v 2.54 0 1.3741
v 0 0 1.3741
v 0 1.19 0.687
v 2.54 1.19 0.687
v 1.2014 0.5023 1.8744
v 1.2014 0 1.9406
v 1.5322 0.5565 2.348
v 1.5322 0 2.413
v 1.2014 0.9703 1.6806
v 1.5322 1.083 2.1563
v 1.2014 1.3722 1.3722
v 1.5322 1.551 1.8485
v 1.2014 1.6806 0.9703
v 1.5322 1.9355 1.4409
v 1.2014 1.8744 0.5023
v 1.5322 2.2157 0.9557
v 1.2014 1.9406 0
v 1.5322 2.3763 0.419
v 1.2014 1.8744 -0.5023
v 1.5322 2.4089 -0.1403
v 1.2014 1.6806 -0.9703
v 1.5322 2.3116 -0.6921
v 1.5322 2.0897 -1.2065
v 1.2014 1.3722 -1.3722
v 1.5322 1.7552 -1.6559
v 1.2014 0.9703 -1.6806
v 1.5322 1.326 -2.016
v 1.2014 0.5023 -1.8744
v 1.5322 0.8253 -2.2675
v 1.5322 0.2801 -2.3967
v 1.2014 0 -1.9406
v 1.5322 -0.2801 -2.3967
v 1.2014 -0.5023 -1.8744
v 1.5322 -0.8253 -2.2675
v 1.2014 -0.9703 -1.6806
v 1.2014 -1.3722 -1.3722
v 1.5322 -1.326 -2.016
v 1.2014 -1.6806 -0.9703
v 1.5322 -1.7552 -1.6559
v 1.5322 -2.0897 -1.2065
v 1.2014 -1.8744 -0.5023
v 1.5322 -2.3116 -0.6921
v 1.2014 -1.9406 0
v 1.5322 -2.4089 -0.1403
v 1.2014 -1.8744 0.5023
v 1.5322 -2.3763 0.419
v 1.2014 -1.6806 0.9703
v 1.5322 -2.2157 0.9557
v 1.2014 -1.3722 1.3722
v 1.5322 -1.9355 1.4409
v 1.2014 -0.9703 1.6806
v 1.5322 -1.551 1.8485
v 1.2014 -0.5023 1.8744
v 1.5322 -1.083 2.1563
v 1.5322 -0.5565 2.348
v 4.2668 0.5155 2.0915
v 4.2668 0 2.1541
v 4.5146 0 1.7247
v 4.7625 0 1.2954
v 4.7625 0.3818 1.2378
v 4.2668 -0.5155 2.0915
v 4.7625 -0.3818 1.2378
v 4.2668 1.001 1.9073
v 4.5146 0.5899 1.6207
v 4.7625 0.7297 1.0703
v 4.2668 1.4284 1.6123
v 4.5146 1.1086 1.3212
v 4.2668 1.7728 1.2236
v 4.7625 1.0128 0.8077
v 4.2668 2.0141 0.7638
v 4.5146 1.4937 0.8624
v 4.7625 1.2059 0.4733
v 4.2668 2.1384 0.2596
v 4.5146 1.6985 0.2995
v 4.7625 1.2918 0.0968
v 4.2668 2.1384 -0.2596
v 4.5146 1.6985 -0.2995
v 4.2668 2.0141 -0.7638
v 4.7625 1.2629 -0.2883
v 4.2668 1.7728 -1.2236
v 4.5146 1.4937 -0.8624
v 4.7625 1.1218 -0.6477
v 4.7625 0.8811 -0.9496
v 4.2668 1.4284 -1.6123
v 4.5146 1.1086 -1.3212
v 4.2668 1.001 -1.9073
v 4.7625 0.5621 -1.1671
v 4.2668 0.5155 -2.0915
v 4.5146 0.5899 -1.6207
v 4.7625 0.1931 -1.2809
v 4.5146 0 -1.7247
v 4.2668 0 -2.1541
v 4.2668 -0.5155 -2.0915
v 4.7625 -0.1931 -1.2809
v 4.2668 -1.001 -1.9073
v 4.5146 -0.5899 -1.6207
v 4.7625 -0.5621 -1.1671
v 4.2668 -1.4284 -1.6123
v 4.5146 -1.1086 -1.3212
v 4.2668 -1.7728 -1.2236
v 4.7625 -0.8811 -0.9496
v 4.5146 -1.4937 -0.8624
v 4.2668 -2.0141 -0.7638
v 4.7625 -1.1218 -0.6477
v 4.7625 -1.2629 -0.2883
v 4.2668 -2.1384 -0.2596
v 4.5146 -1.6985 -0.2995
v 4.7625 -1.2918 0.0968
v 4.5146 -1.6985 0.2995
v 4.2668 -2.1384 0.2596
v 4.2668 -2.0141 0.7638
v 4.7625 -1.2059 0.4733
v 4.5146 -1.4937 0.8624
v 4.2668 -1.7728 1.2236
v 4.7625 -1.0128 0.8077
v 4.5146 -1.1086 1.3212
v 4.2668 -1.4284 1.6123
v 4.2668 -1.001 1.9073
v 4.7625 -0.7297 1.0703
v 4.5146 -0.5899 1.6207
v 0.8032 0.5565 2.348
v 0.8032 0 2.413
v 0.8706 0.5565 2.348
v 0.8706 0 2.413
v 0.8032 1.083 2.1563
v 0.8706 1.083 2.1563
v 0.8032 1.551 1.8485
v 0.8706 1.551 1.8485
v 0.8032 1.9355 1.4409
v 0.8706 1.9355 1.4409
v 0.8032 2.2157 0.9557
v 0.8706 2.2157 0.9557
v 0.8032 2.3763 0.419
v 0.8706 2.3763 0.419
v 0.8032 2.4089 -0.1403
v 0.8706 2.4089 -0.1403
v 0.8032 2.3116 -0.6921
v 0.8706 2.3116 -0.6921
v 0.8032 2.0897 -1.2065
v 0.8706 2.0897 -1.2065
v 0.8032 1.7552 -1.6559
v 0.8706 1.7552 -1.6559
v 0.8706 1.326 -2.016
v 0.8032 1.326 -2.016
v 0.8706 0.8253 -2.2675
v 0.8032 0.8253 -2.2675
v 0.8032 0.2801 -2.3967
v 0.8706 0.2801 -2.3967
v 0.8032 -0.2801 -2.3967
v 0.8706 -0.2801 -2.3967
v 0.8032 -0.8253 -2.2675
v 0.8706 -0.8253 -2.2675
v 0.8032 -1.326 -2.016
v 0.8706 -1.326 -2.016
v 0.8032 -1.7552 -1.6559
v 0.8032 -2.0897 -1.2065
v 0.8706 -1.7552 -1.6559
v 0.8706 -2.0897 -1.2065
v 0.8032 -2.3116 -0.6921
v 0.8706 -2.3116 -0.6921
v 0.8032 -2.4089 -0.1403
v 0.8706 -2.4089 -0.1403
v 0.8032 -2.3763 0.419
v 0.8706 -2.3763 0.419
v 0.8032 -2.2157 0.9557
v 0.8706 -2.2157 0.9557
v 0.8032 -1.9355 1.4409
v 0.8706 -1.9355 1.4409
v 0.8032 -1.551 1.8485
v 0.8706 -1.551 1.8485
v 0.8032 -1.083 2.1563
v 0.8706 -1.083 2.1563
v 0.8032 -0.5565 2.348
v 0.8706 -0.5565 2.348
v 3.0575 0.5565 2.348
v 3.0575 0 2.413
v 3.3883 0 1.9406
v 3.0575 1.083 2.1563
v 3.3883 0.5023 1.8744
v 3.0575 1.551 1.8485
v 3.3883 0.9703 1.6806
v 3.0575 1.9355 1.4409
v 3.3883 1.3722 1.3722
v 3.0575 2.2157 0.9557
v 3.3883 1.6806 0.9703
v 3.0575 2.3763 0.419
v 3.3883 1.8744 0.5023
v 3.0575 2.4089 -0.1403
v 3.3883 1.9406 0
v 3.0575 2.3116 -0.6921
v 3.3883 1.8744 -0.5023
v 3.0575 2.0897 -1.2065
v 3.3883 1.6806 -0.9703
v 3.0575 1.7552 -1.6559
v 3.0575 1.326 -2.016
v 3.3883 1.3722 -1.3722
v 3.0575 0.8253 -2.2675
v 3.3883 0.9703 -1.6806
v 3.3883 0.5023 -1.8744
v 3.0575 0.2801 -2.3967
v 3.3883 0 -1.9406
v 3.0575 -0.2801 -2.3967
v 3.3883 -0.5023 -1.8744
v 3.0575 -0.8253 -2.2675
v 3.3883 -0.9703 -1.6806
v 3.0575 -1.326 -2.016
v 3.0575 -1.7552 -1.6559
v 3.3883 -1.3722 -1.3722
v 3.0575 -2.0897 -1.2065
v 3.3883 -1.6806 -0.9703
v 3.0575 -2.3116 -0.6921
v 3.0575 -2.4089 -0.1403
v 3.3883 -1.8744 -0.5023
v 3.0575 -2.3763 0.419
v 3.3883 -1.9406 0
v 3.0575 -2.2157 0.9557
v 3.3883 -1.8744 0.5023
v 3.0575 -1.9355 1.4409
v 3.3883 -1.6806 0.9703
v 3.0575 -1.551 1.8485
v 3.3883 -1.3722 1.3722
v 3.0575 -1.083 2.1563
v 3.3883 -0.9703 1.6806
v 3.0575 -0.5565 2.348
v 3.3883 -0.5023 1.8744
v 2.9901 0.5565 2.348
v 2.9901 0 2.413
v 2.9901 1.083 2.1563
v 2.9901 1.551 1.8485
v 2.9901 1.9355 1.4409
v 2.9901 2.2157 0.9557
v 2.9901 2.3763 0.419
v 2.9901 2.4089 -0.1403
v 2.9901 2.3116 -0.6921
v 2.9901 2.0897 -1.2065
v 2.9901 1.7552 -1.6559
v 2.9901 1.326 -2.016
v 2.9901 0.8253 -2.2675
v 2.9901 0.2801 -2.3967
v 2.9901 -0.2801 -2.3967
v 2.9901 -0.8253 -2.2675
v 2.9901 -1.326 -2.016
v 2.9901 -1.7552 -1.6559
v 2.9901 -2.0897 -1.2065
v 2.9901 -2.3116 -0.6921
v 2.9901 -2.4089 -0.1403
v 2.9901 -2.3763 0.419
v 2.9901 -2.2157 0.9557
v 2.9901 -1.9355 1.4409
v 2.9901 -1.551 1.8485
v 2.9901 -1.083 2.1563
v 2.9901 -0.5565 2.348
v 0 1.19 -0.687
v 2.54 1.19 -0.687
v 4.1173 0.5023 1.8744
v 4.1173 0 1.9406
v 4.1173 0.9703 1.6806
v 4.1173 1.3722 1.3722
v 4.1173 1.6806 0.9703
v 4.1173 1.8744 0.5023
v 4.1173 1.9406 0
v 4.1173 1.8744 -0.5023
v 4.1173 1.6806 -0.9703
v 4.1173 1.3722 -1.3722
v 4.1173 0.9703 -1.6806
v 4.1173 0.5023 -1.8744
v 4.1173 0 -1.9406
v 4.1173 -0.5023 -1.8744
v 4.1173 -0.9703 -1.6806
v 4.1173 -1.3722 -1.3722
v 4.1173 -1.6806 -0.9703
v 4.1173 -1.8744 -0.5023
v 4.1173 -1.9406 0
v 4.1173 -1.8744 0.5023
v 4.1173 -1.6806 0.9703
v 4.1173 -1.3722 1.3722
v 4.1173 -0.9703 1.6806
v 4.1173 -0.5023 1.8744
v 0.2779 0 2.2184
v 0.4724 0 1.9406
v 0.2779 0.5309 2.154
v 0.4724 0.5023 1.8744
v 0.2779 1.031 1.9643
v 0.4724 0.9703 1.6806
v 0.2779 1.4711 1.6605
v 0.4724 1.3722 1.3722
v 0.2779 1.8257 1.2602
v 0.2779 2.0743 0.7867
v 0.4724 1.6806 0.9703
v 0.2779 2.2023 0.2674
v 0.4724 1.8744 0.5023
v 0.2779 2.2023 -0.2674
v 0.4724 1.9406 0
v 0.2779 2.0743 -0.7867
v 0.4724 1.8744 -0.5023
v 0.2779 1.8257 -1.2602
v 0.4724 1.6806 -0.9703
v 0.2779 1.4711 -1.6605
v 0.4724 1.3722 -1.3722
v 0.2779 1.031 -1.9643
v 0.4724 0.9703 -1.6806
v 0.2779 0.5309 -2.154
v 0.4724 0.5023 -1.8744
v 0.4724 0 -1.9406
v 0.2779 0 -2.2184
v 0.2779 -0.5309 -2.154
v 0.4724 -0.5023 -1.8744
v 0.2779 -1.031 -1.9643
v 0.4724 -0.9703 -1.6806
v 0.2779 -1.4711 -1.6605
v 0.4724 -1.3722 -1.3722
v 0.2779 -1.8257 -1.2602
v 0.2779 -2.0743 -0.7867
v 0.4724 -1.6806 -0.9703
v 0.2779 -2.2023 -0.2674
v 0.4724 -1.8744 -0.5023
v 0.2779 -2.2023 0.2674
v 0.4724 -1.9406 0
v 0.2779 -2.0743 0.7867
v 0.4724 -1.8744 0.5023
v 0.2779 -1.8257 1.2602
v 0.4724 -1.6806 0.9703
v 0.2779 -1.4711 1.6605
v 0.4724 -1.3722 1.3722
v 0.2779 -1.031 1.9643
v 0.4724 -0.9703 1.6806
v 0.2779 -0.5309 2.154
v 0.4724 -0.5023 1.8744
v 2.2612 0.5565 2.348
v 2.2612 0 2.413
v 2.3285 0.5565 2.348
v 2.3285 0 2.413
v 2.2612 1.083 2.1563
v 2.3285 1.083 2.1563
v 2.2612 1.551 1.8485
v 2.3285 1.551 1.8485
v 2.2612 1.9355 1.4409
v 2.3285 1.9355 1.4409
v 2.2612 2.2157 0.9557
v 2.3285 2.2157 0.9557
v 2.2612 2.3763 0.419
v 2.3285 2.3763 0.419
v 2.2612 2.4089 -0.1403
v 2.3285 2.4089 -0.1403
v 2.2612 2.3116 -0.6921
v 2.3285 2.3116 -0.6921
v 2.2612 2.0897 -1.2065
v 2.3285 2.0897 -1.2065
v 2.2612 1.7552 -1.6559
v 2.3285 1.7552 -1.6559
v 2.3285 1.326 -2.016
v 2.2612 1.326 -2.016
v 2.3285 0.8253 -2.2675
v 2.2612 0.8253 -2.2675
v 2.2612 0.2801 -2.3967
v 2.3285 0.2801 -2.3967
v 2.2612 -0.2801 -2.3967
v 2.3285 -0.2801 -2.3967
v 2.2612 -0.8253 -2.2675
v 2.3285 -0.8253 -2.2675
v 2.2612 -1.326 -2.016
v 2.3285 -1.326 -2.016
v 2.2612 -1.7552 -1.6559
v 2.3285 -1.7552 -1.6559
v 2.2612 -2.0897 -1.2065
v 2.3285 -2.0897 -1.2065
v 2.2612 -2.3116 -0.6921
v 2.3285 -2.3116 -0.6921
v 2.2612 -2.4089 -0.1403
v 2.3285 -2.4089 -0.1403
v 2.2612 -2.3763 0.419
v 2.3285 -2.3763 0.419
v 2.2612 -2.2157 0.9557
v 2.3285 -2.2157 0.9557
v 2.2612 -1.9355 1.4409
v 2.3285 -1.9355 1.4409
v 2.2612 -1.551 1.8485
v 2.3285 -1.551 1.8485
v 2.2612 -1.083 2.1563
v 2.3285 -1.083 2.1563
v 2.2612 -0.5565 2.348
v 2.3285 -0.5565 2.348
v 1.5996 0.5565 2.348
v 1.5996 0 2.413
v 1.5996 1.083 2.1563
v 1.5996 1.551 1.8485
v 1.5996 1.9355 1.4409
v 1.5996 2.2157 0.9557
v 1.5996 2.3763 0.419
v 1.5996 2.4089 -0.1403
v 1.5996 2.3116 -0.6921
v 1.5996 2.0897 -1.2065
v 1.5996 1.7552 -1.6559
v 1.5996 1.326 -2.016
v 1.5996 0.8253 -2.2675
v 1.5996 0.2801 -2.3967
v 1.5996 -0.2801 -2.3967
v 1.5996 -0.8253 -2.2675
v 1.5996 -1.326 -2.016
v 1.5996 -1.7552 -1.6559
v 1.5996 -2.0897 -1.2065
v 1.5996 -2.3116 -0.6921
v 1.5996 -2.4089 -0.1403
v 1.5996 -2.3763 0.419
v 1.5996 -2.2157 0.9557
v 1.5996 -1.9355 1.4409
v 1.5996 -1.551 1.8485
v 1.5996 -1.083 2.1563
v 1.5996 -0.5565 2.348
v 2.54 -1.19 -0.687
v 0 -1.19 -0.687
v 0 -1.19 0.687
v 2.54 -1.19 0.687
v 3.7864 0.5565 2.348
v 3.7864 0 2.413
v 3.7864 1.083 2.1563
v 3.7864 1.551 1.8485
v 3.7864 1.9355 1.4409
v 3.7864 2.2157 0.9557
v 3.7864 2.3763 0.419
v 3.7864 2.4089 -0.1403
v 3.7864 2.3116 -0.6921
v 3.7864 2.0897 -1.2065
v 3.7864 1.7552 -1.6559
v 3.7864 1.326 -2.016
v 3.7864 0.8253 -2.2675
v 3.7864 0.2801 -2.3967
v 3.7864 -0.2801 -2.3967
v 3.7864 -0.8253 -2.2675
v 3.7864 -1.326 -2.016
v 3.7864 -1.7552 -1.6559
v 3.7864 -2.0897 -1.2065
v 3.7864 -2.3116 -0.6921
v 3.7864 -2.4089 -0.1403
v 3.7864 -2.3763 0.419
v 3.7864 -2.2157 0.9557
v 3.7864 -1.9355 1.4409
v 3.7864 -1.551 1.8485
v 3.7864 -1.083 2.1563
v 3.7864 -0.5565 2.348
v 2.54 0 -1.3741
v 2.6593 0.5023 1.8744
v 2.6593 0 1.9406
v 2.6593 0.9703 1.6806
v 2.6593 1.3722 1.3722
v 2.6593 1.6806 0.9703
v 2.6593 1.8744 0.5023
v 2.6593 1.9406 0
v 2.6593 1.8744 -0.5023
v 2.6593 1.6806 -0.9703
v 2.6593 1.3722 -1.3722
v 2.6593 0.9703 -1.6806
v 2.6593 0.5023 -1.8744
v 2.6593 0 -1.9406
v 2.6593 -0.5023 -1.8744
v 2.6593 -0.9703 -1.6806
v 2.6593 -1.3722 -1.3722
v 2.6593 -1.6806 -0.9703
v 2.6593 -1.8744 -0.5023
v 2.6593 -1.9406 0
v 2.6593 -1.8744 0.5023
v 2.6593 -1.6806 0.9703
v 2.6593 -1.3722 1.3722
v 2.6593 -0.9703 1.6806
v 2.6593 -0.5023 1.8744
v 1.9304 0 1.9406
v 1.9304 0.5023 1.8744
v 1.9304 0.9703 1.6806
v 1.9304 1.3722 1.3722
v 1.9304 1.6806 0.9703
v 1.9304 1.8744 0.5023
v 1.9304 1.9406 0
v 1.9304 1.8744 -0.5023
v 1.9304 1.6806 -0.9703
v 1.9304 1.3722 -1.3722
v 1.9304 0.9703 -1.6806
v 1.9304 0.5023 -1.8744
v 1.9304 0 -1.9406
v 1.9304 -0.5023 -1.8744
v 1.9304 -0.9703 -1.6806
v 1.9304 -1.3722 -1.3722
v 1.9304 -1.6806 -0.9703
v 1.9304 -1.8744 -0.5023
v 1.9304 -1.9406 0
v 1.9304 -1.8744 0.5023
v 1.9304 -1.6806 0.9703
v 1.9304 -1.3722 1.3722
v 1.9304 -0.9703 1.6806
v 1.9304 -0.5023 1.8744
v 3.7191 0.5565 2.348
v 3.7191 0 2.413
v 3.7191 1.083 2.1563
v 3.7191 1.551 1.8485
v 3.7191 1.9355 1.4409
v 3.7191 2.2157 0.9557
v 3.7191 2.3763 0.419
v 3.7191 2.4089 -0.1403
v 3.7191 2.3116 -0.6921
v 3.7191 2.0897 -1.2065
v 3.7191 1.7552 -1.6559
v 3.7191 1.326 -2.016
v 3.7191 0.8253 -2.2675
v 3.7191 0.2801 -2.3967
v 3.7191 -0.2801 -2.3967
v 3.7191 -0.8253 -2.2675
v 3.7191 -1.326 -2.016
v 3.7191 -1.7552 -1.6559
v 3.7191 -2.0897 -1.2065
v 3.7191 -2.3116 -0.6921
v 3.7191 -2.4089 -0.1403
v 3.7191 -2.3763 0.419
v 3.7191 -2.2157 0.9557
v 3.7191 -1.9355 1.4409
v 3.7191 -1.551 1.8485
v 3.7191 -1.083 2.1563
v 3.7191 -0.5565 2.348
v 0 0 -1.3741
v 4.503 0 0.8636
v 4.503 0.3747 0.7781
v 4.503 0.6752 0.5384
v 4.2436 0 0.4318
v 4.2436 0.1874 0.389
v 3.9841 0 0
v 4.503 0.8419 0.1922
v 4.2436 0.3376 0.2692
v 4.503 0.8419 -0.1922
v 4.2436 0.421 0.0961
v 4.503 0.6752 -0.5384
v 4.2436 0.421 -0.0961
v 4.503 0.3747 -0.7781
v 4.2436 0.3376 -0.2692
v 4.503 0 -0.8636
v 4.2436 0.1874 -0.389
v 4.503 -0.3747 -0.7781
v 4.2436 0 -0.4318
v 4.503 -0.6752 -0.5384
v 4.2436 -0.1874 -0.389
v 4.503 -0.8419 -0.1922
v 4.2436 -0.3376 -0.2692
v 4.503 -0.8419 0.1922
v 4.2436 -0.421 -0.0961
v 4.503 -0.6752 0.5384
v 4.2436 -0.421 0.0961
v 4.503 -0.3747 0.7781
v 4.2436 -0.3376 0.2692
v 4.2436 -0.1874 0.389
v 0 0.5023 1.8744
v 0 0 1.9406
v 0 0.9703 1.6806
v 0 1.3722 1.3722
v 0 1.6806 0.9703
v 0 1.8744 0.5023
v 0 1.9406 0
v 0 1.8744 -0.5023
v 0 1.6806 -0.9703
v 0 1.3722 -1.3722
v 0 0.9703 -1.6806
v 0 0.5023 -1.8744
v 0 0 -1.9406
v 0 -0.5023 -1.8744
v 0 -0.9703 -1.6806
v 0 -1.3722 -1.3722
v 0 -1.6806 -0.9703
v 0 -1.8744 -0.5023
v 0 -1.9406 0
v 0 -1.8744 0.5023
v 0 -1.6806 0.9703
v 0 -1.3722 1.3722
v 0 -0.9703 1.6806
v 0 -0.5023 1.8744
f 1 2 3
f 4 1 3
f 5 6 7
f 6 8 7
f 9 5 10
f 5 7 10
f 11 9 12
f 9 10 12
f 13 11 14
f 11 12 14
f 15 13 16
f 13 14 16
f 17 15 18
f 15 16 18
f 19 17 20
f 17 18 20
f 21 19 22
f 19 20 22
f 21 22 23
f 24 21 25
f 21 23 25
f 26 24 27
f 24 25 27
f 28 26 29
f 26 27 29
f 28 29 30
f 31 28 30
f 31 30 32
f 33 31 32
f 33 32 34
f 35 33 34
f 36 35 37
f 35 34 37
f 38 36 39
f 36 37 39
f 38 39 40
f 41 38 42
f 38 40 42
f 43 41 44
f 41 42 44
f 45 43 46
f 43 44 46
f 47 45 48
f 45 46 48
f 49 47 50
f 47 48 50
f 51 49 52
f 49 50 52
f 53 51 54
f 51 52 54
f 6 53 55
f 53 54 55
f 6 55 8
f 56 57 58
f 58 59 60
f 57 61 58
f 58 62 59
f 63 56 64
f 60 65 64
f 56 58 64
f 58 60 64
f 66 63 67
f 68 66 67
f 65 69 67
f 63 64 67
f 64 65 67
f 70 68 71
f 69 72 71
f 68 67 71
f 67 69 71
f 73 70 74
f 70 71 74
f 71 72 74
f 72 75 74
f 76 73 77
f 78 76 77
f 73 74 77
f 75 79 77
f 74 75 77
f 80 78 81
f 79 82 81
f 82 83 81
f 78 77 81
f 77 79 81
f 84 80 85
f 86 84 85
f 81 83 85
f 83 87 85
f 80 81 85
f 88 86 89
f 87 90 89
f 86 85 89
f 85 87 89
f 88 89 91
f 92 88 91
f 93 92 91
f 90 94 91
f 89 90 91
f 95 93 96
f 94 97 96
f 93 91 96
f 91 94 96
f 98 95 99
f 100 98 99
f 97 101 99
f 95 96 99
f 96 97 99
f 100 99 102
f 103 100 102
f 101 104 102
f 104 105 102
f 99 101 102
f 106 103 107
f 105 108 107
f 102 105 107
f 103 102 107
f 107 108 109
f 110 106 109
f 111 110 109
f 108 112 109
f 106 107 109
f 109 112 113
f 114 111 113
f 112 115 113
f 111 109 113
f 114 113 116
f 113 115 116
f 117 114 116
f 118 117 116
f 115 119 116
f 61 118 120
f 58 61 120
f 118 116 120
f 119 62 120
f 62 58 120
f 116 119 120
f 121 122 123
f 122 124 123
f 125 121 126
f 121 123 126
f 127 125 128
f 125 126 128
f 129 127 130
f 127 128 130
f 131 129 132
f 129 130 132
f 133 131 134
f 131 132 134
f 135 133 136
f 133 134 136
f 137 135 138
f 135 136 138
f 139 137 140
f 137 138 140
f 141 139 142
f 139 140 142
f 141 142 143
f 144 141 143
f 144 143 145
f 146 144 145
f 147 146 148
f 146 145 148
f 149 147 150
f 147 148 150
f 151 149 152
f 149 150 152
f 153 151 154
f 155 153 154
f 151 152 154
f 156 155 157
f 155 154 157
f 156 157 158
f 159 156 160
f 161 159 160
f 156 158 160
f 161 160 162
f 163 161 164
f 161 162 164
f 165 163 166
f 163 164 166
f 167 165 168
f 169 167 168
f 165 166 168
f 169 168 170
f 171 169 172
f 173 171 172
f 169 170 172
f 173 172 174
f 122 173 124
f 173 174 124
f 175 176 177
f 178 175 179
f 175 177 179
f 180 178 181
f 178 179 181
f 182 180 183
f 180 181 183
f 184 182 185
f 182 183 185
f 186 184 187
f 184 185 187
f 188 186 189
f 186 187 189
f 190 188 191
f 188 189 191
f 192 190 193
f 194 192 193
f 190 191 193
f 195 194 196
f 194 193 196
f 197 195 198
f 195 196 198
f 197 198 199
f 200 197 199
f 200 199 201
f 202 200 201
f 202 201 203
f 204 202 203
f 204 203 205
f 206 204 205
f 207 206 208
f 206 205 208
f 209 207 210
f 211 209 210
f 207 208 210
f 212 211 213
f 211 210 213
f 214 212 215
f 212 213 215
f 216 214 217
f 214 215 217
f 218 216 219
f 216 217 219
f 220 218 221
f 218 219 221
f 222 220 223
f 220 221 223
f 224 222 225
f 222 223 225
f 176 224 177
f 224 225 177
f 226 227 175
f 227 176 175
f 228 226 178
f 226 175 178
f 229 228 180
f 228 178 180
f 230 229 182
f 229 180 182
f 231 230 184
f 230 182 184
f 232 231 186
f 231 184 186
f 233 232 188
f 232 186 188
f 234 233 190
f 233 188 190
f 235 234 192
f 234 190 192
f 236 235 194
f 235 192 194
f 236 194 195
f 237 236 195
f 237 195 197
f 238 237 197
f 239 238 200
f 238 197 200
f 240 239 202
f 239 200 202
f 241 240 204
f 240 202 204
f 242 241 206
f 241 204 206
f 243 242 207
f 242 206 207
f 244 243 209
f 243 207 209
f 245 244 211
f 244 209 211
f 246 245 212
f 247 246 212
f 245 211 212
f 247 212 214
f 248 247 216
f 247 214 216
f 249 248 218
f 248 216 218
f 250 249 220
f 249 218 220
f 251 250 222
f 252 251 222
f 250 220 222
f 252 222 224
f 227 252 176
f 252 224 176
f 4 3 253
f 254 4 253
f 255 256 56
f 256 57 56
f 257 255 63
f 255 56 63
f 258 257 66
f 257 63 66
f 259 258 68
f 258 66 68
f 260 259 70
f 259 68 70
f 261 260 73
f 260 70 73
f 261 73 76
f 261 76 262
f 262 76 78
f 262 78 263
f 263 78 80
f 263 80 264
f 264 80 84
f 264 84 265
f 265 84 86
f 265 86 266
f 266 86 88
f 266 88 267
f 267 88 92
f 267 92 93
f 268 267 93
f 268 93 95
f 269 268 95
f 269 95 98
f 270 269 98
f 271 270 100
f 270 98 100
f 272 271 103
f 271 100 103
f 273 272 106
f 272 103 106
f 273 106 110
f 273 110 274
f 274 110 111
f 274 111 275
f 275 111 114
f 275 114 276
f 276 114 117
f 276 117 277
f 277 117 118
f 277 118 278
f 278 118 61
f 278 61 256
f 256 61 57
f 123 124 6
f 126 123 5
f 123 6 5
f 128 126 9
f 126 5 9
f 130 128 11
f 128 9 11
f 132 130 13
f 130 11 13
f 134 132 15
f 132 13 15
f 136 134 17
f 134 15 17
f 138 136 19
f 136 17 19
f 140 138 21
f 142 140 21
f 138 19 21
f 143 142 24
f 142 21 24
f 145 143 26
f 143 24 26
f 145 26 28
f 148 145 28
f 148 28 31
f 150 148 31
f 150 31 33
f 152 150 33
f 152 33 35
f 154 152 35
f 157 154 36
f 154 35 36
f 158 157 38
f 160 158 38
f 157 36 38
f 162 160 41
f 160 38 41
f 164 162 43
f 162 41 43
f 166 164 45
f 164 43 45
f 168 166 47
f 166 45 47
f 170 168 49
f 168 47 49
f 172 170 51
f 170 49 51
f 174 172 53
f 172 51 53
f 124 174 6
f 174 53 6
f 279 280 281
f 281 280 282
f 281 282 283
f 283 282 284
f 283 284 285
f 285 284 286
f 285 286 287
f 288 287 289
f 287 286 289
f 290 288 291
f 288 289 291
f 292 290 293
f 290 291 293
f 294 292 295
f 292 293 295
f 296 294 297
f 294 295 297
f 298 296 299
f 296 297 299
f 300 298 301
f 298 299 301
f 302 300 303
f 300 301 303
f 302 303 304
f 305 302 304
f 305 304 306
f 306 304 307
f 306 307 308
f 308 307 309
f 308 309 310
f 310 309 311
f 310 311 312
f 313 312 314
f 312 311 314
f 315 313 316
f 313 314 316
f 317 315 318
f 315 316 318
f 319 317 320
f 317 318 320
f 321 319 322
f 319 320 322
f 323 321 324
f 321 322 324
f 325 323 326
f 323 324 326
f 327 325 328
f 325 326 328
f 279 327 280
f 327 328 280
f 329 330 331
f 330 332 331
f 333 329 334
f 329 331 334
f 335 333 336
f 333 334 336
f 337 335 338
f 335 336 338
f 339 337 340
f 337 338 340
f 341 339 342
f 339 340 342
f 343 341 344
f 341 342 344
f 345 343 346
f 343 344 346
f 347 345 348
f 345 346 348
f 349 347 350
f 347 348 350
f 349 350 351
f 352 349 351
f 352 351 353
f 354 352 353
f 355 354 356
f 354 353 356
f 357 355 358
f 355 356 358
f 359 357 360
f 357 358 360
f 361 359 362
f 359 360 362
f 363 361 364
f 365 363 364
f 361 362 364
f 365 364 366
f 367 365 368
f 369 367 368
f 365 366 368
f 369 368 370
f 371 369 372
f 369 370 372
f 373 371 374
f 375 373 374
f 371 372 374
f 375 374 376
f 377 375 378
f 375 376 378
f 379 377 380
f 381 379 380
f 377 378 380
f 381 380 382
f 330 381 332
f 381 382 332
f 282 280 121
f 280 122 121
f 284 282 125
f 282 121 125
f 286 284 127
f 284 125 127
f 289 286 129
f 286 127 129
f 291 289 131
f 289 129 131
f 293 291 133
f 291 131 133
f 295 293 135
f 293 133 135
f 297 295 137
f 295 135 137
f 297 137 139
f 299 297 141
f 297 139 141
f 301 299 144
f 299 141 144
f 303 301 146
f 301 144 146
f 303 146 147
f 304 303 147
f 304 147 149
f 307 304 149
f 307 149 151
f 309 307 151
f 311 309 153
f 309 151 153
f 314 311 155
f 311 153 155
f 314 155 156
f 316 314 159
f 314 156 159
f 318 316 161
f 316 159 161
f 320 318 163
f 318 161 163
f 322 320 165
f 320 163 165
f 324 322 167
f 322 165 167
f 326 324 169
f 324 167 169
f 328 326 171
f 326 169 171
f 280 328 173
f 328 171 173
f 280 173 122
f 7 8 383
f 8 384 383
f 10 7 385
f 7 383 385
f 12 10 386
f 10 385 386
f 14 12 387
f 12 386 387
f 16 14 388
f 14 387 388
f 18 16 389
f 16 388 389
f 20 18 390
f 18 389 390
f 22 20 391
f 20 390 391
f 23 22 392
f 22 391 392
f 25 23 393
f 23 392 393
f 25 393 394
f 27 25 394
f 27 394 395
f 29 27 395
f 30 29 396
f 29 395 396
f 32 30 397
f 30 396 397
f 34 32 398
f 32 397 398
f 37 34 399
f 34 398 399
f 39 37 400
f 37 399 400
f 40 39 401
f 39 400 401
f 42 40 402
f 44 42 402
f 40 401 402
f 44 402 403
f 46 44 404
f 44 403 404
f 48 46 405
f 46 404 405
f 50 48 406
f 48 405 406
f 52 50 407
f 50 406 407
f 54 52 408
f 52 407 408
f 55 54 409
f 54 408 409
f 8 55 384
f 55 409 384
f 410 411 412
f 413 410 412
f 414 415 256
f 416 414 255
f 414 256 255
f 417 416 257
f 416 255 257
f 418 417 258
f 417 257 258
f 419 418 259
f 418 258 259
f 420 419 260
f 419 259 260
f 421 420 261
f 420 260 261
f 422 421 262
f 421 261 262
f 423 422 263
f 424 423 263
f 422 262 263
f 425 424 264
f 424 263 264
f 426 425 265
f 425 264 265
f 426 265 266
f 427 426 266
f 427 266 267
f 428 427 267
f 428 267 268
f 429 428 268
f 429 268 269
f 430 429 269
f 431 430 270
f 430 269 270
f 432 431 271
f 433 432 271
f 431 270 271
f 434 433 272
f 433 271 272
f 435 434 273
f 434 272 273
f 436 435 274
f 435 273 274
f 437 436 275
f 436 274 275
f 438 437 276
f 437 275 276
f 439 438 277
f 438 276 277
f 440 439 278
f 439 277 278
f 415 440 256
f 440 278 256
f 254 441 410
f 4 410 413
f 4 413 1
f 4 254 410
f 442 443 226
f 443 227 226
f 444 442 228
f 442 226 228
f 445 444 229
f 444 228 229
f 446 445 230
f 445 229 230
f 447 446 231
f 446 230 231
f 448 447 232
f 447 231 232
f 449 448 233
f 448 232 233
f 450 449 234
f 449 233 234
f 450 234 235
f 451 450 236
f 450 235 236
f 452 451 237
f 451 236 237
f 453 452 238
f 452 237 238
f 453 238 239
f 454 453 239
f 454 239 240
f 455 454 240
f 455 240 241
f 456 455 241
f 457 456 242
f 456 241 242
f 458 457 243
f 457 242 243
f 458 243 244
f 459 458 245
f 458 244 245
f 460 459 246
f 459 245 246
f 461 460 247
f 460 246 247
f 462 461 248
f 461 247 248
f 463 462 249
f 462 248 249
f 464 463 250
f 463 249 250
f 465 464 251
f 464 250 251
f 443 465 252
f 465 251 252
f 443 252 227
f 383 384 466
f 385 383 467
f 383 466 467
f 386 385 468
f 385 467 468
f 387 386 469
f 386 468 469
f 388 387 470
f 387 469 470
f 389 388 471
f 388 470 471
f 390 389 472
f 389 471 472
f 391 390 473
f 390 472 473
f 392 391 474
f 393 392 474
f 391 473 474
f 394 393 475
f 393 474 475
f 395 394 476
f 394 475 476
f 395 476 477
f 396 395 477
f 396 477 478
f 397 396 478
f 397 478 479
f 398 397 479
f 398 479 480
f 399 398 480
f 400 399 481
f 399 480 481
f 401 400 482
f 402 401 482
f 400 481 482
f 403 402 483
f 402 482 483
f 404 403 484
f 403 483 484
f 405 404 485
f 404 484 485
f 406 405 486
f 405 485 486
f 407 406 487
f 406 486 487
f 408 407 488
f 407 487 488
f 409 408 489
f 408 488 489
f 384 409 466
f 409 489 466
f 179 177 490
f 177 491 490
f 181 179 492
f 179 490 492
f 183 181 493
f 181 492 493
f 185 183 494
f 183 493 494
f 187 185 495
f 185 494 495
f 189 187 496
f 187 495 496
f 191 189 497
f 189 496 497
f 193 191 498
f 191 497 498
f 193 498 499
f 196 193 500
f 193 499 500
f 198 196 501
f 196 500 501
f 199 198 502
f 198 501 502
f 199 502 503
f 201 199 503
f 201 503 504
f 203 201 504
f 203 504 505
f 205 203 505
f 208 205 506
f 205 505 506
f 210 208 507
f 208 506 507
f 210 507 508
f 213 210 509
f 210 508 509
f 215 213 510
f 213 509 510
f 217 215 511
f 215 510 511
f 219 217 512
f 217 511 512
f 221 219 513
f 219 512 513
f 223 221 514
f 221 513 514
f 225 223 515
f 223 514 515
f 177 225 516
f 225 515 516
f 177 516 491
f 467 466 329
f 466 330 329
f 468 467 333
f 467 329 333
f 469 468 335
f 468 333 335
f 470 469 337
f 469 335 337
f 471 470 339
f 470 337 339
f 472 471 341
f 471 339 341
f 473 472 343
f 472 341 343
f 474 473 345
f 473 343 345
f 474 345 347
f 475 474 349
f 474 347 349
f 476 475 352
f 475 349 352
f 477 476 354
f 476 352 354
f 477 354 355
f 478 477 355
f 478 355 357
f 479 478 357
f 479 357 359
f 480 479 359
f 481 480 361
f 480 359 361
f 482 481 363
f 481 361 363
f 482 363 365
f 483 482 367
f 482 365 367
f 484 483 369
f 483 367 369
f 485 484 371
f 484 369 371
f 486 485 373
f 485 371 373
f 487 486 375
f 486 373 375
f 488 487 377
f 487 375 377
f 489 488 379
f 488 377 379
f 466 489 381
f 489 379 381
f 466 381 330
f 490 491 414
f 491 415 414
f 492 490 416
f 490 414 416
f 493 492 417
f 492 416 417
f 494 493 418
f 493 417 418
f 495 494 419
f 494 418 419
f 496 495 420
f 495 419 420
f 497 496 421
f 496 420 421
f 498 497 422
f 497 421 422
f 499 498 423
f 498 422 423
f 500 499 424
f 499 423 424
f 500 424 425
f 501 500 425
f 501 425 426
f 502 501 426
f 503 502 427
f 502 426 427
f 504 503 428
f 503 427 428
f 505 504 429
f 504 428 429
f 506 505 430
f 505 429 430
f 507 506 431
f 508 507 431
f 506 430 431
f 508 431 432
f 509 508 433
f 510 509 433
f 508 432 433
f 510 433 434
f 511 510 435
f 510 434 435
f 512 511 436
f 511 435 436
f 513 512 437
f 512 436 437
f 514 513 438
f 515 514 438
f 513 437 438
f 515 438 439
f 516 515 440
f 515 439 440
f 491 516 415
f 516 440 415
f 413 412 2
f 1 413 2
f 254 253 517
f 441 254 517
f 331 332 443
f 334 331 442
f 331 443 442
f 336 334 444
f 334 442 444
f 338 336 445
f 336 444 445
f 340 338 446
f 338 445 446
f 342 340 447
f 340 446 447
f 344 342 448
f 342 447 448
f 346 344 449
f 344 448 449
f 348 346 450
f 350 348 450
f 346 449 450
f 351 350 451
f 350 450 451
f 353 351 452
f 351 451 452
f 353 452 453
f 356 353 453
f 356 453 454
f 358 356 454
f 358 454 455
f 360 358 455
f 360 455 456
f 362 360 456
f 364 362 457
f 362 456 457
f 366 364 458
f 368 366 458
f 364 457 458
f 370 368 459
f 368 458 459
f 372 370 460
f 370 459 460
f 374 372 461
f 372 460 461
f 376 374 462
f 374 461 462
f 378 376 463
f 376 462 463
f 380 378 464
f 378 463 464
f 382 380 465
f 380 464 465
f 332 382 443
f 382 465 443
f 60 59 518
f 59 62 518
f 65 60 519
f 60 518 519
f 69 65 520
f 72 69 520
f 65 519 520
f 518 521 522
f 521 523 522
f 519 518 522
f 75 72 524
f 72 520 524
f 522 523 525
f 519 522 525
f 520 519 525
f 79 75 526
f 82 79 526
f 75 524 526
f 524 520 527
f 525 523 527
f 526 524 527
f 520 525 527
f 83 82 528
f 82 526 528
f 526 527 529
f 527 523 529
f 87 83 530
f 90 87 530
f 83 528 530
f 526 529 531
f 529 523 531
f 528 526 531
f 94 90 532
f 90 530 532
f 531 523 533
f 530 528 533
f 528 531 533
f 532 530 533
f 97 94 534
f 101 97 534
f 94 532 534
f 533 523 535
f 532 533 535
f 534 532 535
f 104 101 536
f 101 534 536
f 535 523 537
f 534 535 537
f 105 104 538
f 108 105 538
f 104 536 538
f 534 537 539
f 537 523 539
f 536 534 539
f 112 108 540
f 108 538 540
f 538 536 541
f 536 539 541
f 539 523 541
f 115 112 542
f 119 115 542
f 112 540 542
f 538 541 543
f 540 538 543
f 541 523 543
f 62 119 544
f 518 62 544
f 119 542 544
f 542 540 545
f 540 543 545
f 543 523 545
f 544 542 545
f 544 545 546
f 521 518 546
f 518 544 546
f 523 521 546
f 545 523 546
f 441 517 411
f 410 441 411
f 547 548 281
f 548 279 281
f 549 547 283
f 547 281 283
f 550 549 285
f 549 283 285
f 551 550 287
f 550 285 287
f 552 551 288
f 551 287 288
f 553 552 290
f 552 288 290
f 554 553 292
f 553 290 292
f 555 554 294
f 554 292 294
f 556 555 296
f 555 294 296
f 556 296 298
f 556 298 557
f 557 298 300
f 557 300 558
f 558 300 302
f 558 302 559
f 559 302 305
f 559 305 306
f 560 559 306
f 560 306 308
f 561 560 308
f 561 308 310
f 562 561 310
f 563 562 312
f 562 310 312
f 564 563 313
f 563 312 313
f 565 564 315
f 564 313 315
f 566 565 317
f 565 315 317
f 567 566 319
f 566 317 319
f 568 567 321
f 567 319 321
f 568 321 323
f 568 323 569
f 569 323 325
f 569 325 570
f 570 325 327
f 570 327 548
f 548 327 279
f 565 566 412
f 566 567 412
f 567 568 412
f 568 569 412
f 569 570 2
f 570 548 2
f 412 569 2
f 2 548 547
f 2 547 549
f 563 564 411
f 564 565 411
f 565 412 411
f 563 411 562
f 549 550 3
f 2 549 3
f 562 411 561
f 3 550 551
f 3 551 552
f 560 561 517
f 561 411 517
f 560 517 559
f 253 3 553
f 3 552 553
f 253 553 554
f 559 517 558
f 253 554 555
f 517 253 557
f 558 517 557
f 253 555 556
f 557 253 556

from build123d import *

# Parameters (mm, degrees)
CUT_EXTRUDE1_DEPTH = 2.54


with BuildPart() as part:
    # Sketch1 → Revolve1 (revolve)
    with BuildSketch(Plane(origin=(0, 0, 0), x_dir=(-1, 0, 0), z_dir=(0, 0, -1)), mode=Mode.PRIVATE) as revolve1_sk:
        Polygon((-4.7625, 1.2954), (-3.984145154, 0), (0, 0), (0, 1.94056), (-0.277871959, 2.218431959), (-0.47244, 1.94056), (-0.803246049, 2.413), (-0.870596619, 2.413), (-1.201402668, 1.94056), (-1.532208718, 2.413), (-1.599559287, 2.413), (-1.930365336, 1.94056), (-2.261171385, 2.413), (-2.328521955, 2.413), (-2.659328004, 1.94056), (-2.990134054, 2.413), (-3.057484623, 2.413), (-3.388290672, 1.94056), (-3.719096722, 2.413), (-3.786447291, 2.413), (-4.11725334, 1.94056), (-4.266750263, 2.154063732), align=None)
    revolve(revolve1_sk.sketch.rotate(Axis((4.762525, 0, 0), (-1, 0, 0)), 270), axis=Axis((4.762525, 0, 0), (-1, 0, 0)))

    # Sketch2 → Cut-Extrude1 (cut)
    with BuildSketch(Plane.ZY):
        Polygon((1.374082094, 0), (0.687041047, 1.18999), (-0.687041047, 1.18999), (-1.374082094, 0), (-0.687041047, -1.18999), (0.687041047, -1.18999), align=None)
    extrude(amount=-CUT_EXTRUDE1_DEPTH, mode=Mode.SUBTRACT)


solid = part.part
